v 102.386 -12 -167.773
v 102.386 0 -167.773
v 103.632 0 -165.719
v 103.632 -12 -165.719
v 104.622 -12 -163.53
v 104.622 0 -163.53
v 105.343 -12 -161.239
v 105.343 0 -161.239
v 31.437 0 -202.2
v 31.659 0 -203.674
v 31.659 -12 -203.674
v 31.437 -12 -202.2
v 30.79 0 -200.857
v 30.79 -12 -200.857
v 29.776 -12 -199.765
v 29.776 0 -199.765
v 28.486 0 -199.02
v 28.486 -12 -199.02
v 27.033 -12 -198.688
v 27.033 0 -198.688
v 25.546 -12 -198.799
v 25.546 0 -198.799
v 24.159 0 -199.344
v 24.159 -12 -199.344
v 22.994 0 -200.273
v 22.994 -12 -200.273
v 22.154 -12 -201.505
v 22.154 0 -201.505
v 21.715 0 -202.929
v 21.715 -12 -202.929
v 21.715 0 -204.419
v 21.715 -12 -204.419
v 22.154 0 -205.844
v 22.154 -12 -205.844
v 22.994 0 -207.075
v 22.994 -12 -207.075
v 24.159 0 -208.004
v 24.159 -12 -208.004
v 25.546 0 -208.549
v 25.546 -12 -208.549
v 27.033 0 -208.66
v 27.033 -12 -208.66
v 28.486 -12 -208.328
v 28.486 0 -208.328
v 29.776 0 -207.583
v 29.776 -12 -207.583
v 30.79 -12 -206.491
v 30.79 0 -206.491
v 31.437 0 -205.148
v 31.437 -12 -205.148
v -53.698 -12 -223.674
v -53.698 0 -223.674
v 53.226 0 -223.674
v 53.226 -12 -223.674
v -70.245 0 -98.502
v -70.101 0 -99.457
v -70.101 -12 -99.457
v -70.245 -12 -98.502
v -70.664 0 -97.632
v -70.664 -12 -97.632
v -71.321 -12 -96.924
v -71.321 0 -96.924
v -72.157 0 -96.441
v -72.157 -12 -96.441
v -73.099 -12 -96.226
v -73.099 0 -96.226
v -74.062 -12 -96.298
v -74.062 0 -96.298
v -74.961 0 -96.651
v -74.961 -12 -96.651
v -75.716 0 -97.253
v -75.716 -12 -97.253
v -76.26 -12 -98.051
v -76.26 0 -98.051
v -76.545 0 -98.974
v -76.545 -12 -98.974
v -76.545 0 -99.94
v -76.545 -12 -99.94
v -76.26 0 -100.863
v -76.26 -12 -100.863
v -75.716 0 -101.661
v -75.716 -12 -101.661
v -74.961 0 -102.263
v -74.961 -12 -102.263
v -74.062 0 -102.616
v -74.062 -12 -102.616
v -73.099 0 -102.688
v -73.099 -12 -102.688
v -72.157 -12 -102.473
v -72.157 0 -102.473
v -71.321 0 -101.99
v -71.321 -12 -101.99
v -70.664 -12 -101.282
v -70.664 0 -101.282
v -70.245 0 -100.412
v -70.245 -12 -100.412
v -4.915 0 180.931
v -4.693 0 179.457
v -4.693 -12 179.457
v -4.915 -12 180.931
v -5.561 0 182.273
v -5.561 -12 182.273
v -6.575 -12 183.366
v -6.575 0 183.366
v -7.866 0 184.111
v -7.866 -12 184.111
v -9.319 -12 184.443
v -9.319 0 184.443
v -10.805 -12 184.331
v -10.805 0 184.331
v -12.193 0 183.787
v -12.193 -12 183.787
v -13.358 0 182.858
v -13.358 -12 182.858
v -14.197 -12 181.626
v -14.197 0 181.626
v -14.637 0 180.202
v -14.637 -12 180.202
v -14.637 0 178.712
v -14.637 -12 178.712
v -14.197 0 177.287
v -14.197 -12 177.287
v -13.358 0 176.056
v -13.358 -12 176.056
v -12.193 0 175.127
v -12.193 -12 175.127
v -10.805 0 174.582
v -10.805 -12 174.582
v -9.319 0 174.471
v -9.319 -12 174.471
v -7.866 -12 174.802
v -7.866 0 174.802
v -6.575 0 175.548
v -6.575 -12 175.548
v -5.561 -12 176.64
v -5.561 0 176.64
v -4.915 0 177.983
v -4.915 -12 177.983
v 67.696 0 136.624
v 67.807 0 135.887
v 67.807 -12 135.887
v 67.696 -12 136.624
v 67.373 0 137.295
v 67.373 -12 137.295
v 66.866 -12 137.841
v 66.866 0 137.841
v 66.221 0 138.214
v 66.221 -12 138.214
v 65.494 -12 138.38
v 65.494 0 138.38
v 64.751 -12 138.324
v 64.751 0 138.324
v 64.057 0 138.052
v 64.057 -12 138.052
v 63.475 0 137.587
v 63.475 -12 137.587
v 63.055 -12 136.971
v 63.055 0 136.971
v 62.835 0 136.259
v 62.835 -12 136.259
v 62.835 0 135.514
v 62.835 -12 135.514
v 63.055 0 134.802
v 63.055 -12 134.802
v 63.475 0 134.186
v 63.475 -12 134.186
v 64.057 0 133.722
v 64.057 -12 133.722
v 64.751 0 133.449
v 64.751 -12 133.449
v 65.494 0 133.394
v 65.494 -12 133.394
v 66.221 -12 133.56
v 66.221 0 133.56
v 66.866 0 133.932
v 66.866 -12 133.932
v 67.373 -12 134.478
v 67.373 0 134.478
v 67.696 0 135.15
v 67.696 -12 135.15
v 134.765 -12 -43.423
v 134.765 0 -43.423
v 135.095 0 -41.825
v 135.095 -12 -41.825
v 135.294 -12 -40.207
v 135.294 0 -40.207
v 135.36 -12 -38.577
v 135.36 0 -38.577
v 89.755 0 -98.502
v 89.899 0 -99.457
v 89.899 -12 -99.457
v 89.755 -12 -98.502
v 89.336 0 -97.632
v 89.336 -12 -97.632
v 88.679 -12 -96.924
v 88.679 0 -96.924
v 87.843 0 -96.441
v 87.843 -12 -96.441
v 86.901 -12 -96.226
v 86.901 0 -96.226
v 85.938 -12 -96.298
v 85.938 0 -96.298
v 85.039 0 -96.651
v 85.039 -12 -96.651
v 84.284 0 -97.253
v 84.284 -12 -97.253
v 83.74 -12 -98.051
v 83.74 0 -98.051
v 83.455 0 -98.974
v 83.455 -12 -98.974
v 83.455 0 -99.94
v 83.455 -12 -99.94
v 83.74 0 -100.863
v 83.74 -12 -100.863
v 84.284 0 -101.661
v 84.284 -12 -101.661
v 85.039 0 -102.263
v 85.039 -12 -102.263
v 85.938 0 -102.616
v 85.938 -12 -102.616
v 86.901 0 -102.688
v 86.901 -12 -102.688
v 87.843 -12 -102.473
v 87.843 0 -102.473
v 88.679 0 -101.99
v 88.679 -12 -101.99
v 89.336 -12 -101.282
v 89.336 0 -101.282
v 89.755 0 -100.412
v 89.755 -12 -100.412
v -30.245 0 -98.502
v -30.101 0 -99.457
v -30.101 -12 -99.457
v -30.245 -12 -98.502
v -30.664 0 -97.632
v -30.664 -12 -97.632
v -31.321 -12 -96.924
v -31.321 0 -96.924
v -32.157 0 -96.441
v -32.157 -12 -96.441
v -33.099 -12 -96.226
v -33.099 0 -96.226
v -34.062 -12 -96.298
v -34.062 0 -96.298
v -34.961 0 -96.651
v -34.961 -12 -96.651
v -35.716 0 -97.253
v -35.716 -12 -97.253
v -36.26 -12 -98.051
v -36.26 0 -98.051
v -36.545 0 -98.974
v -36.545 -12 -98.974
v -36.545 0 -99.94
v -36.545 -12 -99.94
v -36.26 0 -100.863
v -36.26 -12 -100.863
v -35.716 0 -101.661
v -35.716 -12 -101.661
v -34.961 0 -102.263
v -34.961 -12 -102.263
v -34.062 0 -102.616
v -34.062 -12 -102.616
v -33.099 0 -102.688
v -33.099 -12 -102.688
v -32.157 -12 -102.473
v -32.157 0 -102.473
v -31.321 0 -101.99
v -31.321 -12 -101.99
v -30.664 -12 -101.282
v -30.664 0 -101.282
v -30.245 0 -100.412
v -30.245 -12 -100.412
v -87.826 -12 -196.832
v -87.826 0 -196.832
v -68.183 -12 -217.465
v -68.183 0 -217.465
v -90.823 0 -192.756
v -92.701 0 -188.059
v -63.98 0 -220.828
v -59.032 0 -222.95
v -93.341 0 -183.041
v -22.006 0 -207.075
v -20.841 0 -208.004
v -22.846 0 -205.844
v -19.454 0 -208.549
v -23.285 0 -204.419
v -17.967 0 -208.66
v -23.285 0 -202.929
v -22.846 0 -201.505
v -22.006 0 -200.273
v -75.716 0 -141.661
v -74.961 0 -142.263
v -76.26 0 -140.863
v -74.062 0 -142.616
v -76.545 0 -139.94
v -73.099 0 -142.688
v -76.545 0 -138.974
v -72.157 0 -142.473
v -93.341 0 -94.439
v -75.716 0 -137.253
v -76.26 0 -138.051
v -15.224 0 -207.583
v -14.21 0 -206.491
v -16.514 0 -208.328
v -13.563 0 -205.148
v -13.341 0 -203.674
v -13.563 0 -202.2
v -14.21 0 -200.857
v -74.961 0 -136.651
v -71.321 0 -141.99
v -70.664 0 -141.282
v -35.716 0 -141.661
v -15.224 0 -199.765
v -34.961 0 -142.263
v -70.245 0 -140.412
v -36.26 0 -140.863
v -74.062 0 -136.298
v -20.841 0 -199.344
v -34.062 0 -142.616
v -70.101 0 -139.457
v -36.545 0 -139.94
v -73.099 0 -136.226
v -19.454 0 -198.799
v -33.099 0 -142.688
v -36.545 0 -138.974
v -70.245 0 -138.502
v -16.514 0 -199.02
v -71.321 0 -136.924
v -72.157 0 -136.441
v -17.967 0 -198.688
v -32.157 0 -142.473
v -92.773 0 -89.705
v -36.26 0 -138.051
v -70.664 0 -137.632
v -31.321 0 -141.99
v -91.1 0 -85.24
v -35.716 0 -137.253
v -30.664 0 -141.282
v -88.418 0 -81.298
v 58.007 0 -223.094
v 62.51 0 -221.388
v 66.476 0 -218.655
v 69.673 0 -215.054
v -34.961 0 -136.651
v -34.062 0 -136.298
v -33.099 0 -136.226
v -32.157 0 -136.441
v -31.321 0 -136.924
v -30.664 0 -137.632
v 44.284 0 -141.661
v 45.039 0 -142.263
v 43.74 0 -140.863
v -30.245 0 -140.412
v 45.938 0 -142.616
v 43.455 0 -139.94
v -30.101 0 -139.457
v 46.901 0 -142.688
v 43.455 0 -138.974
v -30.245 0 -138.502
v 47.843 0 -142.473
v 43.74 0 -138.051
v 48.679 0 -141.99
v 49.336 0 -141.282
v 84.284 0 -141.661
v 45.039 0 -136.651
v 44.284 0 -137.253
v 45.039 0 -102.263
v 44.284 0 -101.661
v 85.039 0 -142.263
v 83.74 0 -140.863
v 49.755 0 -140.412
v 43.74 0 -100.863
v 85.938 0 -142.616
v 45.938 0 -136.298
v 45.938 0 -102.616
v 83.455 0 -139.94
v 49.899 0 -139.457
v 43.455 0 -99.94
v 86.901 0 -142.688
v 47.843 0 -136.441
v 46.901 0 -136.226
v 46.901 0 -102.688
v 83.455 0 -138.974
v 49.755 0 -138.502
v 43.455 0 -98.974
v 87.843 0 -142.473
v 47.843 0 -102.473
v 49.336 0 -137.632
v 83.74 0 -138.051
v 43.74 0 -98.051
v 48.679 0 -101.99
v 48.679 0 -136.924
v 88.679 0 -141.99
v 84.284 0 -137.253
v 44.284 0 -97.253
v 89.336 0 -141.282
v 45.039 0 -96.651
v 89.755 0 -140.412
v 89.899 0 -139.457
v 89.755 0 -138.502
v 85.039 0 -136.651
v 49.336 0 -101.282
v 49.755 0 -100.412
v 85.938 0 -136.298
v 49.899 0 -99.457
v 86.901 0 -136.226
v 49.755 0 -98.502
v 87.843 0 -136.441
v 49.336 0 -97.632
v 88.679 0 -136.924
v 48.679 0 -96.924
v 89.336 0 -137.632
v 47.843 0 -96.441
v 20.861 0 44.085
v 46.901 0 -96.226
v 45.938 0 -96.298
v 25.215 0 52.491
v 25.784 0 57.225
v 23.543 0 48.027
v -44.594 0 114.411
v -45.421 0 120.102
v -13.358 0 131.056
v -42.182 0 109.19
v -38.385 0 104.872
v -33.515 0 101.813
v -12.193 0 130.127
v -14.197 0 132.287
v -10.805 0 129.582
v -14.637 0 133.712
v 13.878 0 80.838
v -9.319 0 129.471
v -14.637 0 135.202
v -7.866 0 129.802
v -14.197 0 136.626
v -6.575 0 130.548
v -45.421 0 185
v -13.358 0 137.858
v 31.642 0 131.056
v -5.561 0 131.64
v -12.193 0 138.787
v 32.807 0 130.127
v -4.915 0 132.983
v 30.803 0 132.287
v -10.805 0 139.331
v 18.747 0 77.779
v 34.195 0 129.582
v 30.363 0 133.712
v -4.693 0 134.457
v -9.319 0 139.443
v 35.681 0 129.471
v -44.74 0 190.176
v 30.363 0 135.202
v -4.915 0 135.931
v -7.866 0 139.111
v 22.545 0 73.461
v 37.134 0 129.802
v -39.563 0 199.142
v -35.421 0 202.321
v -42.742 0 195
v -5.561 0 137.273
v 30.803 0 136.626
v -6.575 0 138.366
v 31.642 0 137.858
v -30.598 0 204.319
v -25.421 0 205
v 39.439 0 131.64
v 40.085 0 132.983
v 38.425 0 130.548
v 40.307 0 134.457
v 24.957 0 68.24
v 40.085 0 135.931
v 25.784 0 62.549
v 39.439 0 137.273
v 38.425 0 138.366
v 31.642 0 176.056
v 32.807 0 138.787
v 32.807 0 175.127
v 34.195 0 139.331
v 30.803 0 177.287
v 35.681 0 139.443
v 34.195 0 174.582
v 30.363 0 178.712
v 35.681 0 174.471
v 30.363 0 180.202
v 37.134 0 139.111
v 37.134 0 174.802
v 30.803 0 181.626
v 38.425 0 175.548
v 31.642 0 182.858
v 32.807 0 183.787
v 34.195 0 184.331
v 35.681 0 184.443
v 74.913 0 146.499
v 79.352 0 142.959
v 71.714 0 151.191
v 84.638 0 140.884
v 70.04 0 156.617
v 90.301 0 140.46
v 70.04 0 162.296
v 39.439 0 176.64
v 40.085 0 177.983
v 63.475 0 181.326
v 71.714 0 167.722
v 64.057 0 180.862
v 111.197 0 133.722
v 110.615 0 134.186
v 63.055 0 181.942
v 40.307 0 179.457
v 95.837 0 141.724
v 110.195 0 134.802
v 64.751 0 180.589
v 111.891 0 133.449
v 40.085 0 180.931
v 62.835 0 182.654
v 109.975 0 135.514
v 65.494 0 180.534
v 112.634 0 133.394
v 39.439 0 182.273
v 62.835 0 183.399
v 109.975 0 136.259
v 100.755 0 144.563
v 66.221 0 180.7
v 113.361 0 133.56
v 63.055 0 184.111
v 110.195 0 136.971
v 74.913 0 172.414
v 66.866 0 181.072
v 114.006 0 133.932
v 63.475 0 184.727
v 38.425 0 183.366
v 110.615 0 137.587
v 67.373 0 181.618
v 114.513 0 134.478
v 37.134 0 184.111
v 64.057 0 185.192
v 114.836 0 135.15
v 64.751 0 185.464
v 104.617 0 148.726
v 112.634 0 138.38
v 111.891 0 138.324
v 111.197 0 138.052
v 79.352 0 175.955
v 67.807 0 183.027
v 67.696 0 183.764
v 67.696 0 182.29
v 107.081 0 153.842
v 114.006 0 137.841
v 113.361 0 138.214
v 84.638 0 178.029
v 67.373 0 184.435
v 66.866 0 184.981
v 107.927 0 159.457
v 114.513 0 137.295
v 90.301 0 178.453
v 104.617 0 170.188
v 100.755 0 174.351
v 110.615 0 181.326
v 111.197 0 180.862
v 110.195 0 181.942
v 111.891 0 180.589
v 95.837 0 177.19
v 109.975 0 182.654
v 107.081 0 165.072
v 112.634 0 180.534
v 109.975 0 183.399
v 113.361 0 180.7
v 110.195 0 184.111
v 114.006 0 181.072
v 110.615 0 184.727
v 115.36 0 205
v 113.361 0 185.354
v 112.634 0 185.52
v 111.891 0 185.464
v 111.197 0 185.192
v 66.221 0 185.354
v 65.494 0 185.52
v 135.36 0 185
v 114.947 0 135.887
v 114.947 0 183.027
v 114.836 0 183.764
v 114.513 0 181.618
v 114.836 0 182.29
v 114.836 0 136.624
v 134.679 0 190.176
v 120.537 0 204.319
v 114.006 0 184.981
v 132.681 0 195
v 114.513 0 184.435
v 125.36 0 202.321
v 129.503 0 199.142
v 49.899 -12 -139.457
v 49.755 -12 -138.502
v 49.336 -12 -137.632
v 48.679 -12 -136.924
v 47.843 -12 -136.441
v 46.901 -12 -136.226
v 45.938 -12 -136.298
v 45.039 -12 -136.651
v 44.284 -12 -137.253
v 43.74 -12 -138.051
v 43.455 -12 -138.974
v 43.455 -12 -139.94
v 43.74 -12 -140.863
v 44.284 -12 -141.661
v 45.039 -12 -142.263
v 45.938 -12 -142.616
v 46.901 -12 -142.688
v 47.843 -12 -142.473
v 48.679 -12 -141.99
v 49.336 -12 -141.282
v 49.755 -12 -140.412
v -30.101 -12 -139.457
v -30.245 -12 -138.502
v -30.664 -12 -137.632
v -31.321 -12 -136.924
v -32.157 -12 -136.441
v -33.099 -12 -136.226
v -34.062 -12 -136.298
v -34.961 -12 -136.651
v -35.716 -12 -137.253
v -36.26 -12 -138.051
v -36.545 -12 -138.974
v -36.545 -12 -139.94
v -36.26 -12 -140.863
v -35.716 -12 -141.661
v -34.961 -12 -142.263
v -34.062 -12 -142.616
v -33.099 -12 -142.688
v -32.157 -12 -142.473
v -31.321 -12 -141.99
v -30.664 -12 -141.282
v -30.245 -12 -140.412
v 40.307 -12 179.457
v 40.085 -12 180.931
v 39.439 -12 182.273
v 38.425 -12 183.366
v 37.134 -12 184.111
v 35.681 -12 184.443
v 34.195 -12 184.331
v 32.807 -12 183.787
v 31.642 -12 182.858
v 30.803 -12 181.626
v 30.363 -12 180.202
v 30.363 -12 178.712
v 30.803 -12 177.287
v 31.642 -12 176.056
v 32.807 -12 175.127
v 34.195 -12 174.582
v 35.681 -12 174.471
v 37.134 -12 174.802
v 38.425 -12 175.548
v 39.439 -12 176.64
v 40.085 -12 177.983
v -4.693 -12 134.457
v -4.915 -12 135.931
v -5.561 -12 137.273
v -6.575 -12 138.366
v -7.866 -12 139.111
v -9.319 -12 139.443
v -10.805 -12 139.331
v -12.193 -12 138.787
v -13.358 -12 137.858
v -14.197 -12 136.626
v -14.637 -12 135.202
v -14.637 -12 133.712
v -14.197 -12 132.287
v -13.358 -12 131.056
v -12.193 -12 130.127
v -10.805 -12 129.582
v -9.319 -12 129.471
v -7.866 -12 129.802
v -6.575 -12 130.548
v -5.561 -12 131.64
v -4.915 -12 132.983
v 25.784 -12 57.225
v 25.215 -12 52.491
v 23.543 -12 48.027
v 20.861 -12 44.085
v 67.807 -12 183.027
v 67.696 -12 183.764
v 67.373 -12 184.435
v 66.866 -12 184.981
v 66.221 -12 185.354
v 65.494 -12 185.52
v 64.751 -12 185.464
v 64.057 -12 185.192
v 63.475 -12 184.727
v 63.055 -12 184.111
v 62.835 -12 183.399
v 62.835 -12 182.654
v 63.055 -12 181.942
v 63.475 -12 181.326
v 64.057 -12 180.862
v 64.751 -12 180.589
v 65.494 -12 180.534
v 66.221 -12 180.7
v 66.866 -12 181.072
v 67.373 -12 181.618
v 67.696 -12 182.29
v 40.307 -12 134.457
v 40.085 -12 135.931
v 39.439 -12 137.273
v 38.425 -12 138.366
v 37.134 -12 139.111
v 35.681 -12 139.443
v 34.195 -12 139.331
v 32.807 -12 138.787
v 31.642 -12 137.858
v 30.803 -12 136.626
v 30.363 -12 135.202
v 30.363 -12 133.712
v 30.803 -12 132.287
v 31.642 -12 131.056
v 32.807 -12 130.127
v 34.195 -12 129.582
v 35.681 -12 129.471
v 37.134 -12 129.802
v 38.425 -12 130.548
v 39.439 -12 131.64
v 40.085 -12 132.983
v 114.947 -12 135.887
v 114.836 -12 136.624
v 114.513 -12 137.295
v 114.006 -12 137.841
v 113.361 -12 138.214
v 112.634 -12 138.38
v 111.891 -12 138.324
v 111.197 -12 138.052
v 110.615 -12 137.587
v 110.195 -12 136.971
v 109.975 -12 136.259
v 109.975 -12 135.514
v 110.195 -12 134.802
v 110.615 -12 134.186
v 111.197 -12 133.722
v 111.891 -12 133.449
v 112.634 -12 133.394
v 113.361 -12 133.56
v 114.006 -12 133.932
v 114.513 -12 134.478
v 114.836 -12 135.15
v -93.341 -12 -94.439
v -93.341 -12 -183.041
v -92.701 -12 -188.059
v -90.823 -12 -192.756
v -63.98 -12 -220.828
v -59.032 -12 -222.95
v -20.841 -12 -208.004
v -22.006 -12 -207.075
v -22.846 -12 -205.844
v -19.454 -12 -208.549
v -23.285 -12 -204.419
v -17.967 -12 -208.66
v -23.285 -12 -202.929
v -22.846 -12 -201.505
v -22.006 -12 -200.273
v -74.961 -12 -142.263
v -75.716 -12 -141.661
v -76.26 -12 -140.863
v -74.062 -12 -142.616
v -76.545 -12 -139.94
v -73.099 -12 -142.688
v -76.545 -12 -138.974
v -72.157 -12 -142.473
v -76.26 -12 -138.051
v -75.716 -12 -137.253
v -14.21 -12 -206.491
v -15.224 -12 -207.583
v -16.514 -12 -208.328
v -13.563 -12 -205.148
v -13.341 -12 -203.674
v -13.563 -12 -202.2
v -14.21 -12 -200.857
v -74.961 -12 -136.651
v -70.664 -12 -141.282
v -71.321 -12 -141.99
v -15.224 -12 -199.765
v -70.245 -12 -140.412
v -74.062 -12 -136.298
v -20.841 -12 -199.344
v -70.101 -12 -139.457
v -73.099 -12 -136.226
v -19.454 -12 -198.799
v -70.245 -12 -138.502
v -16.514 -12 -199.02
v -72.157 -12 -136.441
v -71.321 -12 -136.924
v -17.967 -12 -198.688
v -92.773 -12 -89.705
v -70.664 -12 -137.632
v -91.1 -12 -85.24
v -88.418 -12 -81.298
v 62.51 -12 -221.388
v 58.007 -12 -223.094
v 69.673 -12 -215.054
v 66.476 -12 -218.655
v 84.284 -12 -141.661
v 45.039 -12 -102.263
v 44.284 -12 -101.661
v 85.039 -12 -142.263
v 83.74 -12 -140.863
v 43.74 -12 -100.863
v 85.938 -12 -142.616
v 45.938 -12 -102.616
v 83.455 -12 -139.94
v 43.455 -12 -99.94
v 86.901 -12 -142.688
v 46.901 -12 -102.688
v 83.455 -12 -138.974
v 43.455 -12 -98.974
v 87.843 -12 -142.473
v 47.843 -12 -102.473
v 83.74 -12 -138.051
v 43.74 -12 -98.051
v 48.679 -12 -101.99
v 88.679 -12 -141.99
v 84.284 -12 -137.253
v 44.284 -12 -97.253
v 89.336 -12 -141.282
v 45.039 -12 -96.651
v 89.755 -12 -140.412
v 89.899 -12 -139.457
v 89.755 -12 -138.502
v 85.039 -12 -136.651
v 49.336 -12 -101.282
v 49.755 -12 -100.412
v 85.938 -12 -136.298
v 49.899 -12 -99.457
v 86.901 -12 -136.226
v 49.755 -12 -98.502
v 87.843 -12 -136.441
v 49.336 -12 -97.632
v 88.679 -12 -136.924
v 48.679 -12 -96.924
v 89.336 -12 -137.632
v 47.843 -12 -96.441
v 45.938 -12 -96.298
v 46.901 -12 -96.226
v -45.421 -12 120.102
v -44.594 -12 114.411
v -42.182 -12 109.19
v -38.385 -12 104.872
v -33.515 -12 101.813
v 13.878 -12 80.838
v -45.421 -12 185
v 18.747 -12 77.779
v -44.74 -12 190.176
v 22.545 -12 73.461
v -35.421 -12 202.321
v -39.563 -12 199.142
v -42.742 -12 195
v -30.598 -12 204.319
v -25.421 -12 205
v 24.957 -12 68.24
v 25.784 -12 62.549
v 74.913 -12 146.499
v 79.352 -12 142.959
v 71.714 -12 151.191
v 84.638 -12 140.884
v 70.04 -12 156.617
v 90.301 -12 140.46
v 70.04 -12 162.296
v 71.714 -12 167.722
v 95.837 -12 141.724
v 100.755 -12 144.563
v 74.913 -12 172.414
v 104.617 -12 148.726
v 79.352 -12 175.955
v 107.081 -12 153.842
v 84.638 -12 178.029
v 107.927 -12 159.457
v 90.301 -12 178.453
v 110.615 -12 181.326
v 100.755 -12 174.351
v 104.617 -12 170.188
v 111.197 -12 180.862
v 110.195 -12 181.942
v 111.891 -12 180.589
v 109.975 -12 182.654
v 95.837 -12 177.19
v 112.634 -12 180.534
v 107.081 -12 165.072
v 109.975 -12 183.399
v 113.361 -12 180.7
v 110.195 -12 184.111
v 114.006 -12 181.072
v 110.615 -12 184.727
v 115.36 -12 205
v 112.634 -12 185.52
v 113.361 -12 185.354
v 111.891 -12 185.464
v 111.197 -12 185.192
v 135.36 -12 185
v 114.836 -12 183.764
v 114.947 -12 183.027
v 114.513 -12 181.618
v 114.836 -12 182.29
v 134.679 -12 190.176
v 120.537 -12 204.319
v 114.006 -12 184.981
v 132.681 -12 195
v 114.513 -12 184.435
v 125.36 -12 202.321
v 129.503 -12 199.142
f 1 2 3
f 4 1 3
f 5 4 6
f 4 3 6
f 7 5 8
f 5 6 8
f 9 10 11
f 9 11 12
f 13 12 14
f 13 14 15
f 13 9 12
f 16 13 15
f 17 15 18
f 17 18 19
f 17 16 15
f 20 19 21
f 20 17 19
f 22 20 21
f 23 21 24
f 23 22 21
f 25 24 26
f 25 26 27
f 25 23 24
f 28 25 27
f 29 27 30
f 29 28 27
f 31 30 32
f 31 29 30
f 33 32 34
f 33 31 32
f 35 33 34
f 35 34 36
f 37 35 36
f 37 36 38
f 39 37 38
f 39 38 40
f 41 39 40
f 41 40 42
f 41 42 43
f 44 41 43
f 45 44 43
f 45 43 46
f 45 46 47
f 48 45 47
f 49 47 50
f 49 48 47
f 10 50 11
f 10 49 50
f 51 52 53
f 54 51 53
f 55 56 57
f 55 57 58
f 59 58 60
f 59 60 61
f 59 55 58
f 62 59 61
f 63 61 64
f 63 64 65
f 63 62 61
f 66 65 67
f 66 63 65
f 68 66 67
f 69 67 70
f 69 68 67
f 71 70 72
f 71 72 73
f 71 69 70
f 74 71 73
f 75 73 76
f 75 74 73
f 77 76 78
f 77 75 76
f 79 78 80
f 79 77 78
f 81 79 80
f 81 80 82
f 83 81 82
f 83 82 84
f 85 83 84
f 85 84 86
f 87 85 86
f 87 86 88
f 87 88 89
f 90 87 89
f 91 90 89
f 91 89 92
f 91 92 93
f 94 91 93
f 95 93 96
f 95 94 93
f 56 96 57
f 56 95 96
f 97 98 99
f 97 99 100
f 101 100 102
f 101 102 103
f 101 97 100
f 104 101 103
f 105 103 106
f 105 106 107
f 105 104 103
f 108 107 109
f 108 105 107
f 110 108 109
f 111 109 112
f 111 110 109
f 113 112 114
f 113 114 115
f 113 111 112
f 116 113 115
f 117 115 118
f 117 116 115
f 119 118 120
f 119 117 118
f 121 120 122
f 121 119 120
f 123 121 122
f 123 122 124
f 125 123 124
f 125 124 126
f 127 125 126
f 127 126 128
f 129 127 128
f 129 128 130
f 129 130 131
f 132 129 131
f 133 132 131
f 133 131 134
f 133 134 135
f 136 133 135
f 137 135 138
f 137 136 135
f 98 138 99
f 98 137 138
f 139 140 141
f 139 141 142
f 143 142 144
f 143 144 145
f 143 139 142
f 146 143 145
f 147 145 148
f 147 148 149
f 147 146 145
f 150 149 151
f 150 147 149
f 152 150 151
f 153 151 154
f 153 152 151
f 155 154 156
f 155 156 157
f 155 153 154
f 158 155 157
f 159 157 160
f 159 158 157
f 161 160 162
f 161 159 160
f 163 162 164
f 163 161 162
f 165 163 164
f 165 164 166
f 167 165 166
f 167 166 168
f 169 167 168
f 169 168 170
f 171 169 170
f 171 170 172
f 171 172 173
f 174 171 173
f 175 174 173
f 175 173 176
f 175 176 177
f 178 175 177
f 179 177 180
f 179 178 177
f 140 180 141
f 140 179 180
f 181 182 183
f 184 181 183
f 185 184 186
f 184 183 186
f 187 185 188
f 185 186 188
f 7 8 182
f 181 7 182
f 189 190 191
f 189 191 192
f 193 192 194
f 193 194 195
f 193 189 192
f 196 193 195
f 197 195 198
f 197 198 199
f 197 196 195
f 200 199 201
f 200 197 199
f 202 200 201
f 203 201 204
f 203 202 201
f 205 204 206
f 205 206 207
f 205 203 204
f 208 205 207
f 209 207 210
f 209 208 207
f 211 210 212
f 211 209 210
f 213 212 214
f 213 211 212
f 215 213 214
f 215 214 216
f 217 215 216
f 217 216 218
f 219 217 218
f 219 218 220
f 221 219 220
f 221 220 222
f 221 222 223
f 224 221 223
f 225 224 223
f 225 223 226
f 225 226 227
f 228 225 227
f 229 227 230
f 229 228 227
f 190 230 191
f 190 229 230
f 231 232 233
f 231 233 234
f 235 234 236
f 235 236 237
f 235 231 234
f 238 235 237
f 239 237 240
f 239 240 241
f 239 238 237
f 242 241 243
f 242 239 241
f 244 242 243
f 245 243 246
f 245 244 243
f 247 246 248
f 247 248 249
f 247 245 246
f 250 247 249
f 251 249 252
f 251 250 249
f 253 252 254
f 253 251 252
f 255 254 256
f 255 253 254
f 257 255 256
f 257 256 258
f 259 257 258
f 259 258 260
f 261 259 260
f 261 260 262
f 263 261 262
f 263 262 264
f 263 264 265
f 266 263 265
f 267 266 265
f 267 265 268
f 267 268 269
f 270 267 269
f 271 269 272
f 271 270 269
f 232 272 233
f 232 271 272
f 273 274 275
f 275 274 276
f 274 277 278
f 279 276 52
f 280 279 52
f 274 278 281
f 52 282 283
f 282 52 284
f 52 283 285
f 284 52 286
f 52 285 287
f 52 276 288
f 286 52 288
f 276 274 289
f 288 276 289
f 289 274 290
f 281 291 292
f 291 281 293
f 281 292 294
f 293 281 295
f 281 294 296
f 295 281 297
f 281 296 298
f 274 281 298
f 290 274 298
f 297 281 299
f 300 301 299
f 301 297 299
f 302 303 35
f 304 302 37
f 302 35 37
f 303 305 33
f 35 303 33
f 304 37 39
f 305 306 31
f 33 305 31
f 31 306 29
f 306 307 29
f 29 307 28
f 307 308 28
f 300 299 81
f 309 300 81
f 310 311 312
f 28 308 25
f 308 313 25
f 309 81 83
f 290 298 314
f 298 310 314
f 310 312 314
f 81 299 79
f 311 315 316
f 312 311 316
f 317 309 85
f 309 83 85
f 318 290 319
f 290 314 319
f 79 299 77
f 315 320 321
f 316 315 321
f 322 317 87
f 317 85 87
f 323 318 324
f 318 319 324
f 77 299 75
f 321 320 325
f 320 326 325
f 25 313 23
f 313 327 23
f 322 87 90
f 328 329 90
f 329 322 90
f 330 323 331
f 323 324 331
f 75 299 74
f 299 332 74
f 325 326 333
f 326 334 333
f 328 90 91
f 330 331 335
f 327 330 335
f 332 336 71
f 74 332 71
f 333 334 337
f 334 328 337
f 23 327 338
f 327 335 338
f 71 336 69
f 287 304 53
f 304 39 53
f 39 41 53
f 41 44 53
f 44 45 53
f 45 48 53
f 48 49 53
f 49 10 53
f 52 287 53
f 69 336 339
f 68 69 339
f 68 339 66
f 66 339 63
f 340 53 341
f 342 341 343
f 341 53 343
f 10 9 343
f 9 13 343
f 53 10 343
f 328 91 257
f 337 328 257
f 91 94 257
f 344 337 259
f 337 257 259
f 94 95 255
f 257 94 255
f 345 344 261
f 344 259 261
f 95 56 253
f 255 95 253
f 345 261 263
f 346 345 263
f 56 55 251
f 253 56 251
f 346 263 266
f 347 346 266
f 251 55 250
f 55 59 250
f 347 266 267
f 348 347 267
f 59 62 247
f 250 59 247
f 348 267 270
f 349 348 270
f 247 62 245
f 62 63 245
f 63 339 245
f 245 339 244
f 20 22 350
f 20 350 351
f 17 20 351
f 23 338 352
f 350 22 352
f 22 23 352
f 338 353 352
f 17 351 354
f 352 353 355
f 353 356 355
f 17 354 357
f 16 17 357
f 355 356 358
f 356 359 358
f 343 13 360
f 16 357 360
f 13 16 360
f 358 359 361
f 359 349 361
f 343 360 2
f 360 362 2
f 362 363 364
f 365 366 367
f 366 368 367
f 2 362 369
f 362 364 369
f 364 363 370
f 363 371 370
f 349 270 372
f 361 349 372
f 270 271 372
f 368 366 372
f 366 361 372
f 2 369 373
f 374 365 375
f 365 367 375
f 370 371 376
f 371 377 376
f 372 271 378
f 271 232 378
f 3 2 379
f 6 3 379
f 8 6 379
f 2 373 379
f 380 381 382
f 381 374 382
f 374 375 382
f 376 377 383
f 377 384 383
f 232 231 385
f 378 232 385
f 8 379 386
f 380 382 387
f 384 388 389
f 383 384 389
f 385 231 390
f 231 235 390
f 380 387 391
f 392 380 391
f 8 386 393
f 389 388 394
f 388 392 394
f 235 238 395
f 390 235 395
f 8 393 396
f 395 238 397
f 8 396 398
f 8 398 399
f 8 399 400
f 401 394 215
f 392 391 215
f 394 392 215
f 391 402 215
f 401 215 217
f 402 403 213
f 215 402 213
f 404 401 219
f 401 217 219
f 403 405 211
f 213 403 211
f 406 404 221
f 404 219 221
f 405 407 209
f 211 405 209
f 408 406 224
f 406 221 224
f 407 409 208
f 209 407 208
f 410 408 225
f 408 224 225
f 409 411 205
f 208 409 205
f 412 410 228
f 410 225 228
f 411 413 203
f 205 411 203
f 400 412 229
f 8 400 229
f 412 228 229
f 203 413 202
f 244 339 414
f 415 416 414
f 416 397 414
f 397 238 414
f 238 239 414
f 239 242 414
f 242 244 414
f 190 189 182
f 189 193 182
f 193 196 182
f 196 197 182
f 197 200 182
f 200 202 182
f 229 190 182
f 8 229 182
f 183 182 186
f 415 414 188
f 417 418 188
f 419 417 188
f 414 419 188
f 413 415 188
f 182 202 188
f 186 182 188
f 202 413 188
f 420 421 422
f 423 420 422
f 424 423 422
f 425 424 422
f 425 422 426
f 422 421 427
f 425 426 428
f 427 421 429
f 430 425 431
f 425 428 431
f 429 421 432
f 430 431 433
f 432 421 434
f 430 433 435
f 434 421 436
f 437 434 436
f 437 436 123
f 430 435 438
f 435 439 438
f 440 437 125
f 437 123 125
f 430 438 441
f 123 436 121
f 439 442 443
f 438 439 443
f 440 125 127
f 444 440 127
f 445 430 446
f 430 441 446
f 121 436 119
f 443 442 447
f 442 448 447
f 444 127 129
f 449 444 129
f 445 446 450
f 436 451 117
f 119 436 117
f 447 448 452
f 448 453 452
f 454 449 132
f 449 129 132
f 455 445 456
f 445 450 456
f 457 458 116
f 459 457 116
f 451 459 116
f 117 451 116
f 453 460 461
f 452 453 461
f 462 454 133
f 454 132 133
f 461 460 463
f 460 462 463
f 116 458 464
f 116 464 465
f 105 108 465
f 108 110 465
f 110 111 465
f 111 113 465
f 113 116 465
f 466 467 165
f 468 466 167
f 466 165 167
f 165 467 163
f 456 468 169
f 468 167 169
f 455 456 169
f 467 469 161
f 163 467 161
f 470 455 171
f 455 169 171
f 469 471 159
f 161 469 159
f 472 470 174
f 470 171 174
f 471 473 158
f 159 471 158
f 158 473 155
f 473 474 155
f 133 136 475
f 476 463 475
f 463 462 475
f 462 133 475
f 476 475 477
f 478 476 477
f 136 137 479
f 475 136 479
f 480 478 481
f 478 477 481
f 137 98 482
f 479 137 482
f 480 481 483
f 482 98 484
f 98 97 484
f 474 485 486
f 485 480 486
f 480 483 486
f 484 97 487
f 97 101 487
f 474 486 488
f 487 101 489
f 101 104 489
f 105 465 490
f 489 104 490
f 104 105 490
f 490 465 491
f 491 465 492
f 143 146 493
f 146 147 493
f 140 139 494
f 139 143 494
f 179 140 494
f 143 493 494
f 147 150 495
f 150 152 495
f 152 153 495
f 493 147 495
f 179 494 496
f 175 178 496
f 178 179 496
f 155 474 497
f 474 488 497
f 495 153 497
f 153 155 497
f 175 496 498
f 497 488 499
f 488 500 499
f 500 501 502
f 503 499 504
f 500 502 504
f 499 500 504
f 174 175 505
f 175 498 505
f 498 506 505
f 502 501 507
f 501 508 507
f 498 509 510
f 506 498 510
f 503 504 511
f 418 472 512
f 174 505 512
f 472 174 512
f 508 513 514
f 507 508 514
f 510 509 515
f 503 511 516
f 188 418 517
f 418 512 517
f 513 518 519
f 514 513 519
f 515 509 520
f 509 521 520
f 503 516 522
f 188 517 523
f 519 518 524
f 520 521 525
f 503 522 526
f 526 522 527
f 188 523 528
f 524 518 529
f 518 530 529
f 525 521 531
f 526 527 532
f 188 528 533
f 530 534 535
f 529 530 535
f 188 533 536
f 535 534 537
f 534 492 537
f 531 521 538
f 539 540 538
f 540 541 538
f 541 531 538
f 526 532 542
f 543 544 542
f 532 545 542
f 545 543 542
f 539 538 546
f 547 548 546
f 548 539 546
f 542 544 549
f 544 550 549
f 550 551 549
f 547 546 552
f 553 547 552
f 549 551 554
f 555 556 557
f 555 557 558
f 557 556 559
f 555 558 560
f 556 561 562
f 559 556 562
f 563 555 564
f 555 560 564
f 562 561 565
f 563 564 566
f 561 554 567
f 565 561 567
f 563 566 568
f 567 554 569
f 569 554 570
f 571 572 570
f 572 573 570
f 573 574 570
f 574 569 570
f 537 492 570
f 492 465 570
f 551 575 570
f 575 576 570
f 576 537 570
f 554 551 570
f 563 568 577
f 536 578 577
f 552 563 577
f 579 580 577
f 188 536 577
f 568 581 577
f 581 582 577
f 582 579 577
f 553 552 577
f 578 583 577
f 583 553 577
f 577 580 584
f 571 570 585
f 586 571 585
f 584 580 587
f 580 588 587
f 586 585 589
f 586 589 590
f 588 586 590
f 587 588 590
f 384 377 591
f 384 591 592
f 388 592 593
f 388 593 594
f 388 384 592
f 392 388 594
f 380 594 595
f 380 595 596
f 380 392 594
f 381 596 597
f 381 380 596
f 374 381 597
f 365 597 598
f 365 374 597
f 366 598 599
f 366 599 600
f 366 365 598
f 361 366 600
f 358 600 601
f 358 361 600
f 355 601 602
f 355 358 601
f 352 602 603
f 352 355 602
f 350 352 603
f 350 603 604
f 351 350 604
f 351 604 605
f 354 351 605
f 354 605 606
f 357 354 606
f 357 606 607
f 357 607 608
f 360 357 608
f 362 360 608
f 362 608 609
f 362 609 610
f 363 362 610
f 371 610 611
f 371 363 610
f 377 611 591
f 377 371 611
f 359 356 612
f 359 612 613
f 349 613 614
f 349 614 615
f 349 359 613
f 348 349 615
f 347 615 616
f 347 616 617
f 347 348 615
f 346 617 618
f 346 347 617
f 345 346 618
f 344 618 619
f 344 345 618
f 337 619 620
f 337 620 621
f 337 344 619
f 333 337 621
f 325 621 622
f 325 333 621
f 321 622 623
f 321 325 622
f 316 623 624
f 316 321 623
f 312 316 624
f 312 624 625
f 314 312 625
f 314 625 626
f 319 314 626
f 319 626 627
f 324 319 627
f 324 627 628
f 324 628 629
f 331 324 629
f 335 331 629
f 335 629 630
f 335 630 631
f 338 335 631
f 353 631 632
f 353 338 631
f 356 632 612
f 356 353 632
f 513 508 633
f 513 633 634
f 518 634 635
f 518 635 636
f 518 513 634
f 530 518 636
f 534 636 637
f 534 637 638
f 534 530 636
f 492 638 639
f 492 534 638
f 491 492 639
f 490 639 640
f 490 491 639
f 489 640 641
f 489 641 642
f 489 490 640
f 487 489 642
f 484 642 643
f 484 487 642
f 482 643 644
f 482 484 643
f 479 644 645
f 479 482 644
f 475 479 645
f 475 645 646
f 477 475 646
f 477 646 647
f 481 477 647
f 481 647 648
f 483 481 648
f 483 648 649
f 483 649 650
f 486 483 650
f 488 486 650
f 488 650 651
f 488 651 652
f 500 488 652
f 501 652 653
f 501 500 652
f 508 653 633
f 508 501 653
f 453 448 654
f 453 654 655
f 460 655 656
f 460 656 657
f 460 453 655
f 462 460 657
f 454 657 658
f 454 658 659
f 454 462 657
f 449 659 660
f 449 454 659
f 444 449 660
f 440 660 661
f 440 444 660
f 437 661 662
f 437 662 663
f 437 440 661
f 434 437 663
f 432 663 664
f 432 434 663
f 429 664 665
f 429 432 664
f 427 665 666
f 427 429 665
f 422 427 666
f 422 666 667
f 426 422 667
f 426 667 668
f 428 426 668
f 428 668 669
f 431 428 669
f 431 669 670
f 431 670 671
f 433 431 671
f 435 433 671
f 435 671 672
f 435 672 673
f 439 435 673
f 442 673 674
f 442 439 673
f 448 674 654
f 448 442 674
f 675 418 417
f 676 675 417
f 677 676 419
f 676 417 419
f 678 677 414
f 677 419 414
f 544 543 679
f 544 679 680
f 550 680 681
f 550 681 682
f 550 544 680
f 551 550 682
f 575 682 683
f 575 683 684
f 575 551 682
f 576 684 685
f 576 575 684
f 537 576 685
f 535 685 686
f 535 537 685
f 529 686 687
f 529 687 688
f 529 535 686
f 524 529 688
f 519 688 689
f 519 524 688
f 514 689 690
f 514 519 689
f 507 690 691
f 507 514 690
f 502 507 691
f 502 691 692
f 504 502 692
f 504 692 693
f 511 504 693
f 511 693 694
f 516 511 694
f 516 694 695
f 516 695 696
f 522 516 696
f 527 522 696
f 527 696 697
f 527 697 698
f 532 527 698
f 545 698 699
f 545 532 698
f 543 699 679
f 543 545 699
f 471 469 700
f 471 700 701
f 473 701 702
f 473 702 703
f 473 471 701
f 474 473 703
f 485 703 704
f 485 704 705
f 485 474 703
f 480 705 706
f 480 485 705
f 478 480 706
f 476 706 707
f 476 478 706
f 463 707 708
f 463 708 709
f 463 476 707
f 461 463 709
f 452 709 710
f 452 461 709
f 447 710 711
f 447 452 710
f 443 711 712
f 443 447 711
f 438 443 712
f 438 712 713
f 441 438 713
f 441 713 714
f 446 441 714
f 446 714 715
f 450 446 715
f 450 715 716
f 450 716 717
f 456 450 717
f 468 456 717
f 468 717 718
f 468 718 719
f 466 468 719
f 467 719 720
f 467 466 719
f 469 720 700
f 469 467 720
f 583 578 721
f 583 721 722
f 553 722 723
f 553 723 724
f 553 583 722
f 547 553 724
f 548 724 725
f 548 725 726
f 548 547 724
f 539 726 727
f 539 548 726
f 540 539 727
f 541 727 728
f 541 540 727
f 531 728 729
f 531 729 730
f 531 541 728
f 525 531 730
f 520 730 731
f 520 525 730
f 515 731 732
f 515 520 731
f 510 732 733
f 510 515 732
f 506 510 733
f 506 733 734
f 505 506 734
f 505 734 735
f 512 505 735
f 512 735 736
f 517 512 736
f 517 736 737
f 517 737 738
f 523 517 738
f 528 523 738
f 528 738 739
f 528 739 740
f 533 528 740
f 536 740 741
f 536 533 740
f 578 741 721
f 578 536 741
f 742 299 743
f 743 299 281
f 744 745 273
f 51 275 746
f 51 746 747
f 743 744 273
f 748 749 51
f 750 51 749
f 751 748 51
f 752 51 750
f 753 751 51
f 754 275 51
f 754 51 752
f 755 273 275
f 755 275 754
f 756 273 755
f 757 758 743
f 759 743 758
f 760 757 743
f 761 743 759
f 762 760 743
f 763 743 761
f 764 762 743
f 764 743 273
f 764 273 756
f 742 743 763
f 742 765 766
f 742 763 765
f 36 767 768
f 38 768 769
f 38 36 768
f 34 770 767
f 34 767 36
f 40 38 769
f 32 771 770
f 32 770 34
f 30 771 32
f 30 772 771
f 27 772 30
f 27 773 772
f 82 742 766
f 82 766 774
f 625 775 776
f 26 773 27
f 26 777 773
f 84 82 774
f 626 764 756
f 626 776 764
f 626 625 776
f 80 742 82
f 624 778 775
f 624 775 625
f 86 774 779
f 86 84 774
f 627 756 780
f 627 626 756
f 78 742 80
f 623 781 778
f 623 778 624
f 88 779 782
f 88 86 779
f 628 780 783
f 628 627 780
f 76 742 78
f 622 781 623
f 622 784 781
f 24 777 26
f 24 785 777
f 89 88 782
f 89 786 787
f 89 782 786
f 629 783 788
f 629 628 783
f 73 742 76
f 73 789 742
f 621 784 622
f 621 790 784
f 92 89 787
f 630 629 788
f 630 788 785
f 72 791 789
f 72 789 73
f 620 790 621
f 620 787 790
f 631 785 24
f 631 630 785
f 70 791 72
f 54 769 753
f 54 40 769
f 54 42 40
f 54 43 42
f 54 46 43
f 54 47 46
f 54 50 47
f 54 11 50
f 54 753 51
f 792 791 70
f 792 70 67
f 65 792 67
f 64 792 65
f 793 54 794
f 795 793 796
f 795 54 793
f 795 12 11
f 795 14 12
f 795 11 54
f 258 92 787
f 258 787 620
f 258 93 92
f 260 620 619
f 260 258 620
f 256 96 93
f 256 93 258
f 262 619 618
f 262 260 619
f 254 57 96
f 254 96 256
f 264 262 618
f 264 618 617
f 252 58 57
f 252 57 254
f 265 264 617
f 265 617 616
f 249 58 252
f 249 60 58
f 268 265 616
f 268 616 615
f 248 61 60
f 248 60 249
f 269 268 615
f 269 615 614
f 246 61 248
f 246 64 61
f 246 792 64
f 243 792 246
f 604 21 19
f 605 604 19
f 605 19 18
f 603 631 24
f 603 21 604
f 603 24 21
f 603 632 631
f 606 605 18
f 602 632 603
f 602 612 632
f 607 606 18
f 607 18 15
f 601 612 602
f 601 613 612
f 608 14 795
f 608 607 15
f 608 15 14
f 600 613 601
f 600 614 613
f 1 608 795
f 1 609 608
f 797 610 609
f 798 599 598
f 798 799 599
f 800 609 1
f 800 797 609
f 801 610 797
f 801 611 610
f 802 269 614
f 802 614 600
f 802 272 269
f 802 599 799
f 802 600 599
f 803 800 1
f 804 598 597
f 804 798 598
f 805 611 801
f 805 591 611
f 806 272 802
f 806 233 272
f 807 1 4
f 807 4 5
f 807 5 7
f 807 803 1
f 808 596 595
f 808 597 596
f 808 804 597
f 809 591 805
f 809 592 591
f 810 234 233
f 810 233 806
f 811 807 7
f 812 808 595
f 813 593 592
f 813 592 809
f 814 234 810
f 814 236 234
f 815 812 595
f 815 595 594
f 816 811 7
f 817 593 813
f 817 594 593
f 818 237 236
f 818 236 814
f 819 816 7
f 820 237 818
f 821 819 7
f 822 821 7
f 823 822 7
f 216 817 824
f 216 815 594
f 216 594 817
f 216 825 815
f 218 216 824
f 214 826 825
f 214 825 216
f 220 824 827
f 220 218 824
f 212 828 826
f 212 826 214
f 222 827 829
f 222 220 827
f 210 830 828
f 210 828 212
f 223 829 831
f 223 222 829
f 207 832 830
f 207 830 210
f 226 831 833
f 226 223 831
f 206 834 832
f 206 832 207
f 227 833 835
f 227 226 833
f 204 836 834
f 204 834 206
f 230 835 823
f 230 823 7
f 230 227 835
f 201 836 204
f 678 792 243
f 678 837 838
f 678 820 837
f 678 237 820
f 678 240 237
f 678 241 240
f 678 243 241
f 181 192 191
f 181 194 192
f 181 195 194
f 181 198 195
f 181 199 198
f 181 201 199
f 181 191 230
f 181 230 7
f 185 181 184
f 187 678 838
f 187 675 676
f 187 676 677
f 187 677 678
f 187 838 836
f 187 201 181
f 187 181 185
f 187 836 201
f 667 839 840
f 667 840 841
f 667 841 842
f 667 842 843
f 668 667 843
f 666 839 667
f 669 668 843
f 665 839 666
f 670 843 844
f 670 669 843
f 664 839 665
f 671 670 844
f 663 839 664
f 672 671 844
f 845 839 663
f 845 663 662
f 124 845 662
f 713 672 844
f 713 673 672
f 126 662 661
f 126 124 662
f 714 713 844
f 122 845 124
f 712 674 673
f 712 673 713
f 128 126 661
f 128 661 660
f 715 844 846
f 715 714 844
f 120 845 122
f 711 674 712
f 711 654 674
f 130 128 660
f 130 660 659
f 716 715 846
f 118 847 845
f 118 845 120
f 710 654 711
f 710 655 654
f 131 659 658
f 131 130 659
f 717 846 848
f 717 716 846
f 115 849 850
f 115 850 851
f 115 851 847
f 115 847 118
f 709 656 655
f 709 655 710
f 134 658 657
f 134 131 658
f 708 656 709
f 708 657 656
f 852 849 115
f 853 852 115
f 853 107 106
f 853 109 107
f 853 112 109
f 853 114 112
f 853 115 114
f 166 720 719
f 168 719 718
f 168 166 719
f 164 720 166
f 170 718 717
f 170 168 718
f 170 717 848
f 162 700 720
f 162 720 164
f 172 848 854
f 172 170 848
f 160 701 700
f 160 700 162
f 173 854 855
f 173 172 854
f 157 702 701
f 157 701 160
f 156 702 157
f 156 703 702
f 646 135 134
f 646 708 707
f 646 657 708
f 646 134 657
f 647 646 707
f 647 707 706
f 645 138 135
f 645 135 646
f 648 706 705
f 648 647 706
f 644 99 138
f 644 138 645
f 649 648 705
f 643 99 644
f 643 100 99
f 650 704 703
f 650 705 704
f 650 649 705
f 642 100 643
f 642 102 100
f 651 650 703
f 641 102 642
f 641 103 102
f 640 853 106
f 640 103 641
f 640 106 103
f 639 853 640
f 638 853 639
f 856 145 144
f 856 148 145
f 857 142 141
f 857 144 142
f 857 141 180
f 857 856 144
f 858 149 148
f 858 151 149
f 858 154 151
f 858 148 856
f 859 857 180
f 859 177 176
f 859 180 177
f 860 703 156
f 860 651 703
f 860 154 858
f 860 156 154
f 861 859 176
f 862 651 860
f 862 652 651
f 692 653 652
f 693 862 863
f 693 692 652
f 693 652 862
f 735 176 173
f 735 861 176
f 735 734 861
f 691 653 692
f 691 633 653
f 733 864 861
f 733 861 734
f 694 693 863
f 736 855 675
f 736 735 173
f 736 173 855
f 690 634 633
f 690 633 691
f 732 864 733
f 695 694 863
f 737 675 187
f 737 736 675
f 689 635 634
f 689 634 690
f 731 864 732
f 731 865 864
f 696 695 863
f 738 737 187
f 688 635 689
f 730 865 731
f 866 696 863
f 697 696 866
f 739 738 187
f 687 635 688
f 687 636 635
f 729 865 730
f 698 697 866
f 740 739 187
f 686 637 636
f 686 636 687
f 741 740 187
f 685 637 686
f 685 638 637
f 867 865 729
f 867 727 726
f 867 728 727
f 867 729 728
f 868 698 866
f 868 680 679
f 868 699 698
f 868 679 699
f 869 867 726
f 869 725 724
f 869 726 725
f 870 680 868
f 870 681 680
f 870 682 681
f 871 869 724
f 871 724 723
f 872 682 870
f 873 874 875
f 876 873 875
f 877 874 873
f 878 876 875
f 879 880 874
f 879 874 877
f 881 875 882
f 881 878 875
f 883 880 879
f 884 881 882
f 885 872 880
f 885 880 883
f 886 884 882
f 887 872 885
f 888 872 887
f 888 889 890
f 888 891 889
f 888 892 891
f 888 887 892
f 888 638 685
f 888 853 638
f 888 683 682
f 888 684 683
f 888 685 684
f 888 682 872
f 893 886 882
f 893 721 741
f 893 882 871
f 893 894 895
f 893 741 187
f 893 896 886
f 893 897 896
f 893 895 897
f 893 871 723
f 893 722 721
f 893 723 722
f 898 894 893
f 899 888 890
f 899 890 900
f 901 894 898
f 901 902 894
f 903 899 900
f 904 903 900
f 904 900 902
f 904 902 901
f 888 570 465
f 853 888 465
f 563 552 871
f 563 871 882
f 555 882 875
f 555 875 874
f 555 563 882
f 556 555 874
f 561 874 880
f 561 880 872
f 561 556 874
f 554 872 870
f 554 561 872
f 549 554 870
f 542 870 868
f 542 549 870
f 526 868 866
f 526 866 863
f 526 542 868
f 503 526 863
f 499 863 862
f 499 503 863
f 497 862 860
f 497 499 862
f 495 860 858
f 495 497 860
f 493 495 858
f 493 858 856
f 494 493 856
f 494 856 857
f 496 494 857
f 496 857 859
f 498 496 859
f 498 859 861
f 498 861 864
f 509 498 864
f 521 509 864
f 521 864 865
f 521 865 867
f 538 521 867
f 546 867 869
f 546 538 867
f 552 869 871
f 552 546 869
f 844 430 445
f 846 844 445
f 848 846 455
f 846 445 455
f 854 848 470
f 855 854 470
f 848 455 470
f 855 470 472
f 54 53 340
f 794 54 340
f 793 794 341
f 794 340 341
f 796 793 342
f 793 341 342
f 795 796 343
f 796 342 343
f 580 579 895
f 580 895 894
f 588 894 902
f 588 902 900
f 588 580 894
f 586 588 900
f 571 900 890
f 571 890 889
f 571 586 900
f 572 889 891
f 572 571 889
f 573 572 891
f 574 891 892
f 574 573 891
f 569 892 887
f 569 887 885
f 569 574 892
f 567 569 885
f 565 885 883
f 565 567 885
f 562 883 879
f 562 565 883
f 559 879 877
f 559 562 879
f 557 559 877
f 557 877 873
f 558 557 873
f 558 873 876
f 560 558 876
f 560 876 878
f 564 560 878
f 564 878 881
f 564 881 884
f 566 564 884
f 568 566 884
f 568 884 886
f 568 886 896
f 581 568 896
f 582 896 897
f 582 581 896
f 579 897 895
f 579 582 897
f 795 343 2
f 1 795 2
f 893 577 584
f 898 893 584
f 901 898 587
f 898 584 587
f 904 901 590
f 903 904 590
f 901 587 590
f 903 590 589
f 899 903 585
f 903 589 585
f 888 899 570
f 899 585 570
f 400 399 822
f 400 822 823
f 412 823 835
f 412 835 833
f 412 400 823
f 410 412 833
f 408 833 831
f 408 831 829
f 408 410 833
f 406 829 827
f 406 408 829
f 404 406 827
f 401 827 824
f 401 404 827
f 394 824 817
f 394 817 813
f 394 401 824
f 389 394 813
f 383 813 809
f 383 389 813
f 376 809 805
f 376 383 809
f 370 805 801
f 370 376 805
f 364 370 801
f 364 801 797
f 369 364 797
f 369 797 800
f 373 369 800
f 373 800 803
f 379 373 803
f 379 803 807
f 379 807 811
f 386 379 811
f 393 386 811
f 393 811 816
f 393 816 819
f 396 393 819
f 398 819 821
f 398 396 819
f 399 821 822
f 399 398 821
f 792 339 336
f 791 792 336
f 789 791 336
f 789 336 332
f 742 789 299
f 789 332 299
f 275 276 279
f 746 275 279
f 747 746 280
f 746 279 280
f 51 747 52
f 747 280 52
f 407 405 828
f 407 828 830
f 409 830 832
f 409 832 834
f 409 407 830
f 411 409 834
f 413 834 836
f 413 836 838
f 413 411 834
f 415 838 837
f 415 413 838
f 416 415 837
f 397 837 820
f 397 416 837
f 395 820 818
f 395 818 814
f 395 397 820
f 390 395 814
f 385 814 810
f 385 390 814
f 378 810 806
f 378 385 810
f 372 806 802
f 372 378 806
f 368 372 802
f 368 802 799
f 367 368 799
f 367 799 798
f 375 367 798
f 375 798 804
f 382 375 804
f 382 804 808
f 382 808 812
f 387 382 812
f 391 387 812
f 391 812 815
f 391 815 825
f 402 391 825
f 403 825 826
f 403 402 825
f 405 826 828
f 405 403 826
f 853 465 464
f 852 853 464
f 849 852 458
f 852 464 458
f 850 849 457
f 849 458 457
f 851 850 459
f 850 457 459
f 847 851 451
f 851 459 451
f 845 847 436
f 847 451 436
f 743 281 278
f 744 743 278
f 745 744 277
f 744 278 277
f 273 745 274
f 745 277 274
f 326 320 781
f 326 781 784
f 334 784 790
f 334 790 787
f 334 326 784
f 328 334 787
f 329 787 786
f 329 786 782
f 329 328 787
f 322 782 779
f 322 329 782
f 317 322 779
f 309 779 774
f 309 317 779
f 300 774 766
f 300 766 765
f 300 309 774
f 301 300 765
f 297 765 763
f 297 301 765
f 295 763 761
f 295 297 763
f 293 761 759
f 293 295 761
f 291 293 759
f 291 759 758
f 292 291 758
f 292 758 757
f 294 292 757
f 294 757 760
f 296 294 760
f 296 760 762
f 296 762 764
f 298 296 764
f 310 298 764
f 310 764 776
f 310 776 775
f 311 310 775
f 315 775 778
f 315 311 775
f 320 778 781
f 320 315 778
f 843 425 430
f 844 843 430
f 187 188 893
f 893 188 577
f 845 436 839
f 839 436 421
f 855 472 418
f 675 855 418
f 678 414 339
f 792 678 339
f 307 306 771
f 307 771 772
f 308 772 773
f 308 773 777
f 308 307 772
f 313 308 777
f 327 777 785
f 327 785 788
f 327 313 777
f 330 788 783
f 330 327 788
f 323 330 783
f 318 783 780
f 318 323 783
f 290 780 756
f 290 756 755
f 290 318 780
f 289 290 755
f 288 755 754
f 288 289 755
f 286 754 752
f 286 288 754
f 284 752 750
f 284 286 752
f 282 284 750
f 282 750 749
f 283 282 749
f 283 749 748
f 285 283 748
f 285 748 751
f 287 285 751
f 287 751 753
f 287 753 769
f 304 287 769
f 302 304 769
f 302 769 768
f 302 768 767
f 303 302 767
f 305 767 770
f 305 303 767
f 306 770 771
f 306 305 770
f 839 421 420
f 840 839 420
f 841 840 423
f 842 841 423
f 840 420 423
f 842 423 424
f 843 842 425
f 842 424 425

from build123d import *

# Parameters (mm, degrees)
F0_R     = 3.24
F0_R_2   = 5
F0_R_3   = 2.5
F0_R_4   = 19.05
F1_DEPTH = 12


with BuildPart() as f1:
    # F0 (on Front) → F1 (new body)
    with BuildSketch(Plane.XZ):
        with BuildLine():
            Line((115.360413, 205), (85.230881, 205))
            Line((85.230881, 205), (25.307446, 205))
            Line((25.307446, 205), (10.35451, 205))
            Line((10.35451, 205), (-13.005401, 205))
            Line((-13.005401, 205), (-25.421186, 205))
            ThreePointArc((-25.421186, 205), (-39.563321, 199.142136), (-45.421186, 185))
            Line((-45.421186, 185), (-45.421186, 120.10159))
            ThreePointArc((-45.421186, 120.10159), (-42.182465, 109.190149), (-33.515232, 101.81262))
            Line((-33.515232, 101.81262), (13.877641, 80.838222))
            ThreePointArc((13.877641, 80.838222), (22.544873, 73.460693), (25.783595, 62.549252))
            Line((25.783595, 62.549252), (25.783595, 57.225308))
            ThreePointArc((25.783595, 57.225308), (24.512499, 50.209031), (20.860781, 44.08459))
            Line((20.860781, 44.08459), (-88.418227, -81.298206))
            ThreePointArc((-88.418227, -81.298206), (-92.069946, -87.422647), (-93.341041, -94.438924))
            Line((-93.341041, -94.438924), (-93.341041, -135.075137))
            Line((-93.341041, -135.075137), (-93.341041, -183.041223))
            ThreePointArc((-93.341041, -183.041223), (-91.911264, -190.467313), (-87.826359, -196.831639))
            Line((-87.826359, -196.831639), (-68.18331, -217.464505))
            ThreePointArc((-68.18331, -217.464505), (-61.578084, -222.056258), (-53.697992, -223.674089))
            Line((-53.697992, -223.674089), (53.22585, -223.674089))
            ThreePointArc((53.22585, -223.674089), (62.510458, -221.388378), (69.672873, -215.053695))
            Line((69.672873, -215.053695), (102.386198, -167.7729))
            ThreePointArc((102.386198, -167.7729), (104.160024, -164.639544), (105.343296, -161.238918))
            Line((105.343296, -161.238918), (134.764535, -43.422655))
            ThreePointArc((134.764535, -43.422655), (135.210885, -41.018094), (135.360413, -38.577032))
            Line((135.360413, -38.577032), (135.360413, 185))
            ThreePointArc((135.360413, 185), (129.502549, 199.142136), (115.360413, 205))
        make_face()
        with Locations((-73.341041, -139.456751)):
            Circle(F0_R, mode=Mode.SUBTRACT)
        with Locations((-18.341041, -203.674089)):
            Circle(F0_R_2, mode=Mode.SUBTRACT)
        with Locations((-33.341041, -139.456751)):
            Circle(F0_R, mode=Mode.SUBTRACT)
        with Locations((-73.341041, -99.456751)):
            Circle(F0_R, mode=Mode.SUBTRACT)
        with Locations((-33.341041, -99.456751)):
            Circle(F0_R, mode=Mode.SUBTRACT)
        with Locations((26.658959, -203.674089)):
            Circle(F0_R_2, mode=Mode.SUBTRACT)
        with Locations((46.658959, -139.456751)):
            Circle(F0_R, mode=Mode.SUBTRACT)
        with Locations((86.658959, -139.456751)):
            Circle(F0_R, mode=Mode.SUBTRACT)
        with Locations((46.658959, -99.456751)):
            Circle(F0_R, mode=Mode.SUBTRACT)
        with Locations((86.658959, -99.456751)):
            Circle(F0_R, mode=Mode.SUBTRACT)
        with Locations((-9.692554, 134.456751)):
            Circle(F0_R_2, mode=Mode.SUBTRACT)
        with Locations((-9.692554, 179.456751)):
            Circle(F0_R_2, mode=Mode.SUBTRACT)
        with Locations((35.307446, 134.456751)):
            Circle(F0_R_2, mode=Mode.SUBTRACT)
        with Locations((65.307446, 135.886751)):
            Circle(F0_R_3, mode=Mode.SUBTRACT)
        with Locations((35.307446, 179.456751)):
            Circle(F0_R_2, mode=Mode.SUBTRACT)
        with Locations((65.307446, 183.026751)):
            Circle(F0_R_3, mode=Mode.SUBTRACT)
        with Locations((112.447446, 135.886751)):
            Circle(F0_R_3, mode=Mode.SUBTRACT)
        with Locations((88.877446, 159.456751)):
            Circle(F0_R_4, mode=Mode.SUBTRACT)
        with Locations((112.447446, 183.026751)):
            Circle(F0_R_3, mode=Mode.SUBTRACT)
    extrude(amount=F1_DEPTH)


solid = f1.part
